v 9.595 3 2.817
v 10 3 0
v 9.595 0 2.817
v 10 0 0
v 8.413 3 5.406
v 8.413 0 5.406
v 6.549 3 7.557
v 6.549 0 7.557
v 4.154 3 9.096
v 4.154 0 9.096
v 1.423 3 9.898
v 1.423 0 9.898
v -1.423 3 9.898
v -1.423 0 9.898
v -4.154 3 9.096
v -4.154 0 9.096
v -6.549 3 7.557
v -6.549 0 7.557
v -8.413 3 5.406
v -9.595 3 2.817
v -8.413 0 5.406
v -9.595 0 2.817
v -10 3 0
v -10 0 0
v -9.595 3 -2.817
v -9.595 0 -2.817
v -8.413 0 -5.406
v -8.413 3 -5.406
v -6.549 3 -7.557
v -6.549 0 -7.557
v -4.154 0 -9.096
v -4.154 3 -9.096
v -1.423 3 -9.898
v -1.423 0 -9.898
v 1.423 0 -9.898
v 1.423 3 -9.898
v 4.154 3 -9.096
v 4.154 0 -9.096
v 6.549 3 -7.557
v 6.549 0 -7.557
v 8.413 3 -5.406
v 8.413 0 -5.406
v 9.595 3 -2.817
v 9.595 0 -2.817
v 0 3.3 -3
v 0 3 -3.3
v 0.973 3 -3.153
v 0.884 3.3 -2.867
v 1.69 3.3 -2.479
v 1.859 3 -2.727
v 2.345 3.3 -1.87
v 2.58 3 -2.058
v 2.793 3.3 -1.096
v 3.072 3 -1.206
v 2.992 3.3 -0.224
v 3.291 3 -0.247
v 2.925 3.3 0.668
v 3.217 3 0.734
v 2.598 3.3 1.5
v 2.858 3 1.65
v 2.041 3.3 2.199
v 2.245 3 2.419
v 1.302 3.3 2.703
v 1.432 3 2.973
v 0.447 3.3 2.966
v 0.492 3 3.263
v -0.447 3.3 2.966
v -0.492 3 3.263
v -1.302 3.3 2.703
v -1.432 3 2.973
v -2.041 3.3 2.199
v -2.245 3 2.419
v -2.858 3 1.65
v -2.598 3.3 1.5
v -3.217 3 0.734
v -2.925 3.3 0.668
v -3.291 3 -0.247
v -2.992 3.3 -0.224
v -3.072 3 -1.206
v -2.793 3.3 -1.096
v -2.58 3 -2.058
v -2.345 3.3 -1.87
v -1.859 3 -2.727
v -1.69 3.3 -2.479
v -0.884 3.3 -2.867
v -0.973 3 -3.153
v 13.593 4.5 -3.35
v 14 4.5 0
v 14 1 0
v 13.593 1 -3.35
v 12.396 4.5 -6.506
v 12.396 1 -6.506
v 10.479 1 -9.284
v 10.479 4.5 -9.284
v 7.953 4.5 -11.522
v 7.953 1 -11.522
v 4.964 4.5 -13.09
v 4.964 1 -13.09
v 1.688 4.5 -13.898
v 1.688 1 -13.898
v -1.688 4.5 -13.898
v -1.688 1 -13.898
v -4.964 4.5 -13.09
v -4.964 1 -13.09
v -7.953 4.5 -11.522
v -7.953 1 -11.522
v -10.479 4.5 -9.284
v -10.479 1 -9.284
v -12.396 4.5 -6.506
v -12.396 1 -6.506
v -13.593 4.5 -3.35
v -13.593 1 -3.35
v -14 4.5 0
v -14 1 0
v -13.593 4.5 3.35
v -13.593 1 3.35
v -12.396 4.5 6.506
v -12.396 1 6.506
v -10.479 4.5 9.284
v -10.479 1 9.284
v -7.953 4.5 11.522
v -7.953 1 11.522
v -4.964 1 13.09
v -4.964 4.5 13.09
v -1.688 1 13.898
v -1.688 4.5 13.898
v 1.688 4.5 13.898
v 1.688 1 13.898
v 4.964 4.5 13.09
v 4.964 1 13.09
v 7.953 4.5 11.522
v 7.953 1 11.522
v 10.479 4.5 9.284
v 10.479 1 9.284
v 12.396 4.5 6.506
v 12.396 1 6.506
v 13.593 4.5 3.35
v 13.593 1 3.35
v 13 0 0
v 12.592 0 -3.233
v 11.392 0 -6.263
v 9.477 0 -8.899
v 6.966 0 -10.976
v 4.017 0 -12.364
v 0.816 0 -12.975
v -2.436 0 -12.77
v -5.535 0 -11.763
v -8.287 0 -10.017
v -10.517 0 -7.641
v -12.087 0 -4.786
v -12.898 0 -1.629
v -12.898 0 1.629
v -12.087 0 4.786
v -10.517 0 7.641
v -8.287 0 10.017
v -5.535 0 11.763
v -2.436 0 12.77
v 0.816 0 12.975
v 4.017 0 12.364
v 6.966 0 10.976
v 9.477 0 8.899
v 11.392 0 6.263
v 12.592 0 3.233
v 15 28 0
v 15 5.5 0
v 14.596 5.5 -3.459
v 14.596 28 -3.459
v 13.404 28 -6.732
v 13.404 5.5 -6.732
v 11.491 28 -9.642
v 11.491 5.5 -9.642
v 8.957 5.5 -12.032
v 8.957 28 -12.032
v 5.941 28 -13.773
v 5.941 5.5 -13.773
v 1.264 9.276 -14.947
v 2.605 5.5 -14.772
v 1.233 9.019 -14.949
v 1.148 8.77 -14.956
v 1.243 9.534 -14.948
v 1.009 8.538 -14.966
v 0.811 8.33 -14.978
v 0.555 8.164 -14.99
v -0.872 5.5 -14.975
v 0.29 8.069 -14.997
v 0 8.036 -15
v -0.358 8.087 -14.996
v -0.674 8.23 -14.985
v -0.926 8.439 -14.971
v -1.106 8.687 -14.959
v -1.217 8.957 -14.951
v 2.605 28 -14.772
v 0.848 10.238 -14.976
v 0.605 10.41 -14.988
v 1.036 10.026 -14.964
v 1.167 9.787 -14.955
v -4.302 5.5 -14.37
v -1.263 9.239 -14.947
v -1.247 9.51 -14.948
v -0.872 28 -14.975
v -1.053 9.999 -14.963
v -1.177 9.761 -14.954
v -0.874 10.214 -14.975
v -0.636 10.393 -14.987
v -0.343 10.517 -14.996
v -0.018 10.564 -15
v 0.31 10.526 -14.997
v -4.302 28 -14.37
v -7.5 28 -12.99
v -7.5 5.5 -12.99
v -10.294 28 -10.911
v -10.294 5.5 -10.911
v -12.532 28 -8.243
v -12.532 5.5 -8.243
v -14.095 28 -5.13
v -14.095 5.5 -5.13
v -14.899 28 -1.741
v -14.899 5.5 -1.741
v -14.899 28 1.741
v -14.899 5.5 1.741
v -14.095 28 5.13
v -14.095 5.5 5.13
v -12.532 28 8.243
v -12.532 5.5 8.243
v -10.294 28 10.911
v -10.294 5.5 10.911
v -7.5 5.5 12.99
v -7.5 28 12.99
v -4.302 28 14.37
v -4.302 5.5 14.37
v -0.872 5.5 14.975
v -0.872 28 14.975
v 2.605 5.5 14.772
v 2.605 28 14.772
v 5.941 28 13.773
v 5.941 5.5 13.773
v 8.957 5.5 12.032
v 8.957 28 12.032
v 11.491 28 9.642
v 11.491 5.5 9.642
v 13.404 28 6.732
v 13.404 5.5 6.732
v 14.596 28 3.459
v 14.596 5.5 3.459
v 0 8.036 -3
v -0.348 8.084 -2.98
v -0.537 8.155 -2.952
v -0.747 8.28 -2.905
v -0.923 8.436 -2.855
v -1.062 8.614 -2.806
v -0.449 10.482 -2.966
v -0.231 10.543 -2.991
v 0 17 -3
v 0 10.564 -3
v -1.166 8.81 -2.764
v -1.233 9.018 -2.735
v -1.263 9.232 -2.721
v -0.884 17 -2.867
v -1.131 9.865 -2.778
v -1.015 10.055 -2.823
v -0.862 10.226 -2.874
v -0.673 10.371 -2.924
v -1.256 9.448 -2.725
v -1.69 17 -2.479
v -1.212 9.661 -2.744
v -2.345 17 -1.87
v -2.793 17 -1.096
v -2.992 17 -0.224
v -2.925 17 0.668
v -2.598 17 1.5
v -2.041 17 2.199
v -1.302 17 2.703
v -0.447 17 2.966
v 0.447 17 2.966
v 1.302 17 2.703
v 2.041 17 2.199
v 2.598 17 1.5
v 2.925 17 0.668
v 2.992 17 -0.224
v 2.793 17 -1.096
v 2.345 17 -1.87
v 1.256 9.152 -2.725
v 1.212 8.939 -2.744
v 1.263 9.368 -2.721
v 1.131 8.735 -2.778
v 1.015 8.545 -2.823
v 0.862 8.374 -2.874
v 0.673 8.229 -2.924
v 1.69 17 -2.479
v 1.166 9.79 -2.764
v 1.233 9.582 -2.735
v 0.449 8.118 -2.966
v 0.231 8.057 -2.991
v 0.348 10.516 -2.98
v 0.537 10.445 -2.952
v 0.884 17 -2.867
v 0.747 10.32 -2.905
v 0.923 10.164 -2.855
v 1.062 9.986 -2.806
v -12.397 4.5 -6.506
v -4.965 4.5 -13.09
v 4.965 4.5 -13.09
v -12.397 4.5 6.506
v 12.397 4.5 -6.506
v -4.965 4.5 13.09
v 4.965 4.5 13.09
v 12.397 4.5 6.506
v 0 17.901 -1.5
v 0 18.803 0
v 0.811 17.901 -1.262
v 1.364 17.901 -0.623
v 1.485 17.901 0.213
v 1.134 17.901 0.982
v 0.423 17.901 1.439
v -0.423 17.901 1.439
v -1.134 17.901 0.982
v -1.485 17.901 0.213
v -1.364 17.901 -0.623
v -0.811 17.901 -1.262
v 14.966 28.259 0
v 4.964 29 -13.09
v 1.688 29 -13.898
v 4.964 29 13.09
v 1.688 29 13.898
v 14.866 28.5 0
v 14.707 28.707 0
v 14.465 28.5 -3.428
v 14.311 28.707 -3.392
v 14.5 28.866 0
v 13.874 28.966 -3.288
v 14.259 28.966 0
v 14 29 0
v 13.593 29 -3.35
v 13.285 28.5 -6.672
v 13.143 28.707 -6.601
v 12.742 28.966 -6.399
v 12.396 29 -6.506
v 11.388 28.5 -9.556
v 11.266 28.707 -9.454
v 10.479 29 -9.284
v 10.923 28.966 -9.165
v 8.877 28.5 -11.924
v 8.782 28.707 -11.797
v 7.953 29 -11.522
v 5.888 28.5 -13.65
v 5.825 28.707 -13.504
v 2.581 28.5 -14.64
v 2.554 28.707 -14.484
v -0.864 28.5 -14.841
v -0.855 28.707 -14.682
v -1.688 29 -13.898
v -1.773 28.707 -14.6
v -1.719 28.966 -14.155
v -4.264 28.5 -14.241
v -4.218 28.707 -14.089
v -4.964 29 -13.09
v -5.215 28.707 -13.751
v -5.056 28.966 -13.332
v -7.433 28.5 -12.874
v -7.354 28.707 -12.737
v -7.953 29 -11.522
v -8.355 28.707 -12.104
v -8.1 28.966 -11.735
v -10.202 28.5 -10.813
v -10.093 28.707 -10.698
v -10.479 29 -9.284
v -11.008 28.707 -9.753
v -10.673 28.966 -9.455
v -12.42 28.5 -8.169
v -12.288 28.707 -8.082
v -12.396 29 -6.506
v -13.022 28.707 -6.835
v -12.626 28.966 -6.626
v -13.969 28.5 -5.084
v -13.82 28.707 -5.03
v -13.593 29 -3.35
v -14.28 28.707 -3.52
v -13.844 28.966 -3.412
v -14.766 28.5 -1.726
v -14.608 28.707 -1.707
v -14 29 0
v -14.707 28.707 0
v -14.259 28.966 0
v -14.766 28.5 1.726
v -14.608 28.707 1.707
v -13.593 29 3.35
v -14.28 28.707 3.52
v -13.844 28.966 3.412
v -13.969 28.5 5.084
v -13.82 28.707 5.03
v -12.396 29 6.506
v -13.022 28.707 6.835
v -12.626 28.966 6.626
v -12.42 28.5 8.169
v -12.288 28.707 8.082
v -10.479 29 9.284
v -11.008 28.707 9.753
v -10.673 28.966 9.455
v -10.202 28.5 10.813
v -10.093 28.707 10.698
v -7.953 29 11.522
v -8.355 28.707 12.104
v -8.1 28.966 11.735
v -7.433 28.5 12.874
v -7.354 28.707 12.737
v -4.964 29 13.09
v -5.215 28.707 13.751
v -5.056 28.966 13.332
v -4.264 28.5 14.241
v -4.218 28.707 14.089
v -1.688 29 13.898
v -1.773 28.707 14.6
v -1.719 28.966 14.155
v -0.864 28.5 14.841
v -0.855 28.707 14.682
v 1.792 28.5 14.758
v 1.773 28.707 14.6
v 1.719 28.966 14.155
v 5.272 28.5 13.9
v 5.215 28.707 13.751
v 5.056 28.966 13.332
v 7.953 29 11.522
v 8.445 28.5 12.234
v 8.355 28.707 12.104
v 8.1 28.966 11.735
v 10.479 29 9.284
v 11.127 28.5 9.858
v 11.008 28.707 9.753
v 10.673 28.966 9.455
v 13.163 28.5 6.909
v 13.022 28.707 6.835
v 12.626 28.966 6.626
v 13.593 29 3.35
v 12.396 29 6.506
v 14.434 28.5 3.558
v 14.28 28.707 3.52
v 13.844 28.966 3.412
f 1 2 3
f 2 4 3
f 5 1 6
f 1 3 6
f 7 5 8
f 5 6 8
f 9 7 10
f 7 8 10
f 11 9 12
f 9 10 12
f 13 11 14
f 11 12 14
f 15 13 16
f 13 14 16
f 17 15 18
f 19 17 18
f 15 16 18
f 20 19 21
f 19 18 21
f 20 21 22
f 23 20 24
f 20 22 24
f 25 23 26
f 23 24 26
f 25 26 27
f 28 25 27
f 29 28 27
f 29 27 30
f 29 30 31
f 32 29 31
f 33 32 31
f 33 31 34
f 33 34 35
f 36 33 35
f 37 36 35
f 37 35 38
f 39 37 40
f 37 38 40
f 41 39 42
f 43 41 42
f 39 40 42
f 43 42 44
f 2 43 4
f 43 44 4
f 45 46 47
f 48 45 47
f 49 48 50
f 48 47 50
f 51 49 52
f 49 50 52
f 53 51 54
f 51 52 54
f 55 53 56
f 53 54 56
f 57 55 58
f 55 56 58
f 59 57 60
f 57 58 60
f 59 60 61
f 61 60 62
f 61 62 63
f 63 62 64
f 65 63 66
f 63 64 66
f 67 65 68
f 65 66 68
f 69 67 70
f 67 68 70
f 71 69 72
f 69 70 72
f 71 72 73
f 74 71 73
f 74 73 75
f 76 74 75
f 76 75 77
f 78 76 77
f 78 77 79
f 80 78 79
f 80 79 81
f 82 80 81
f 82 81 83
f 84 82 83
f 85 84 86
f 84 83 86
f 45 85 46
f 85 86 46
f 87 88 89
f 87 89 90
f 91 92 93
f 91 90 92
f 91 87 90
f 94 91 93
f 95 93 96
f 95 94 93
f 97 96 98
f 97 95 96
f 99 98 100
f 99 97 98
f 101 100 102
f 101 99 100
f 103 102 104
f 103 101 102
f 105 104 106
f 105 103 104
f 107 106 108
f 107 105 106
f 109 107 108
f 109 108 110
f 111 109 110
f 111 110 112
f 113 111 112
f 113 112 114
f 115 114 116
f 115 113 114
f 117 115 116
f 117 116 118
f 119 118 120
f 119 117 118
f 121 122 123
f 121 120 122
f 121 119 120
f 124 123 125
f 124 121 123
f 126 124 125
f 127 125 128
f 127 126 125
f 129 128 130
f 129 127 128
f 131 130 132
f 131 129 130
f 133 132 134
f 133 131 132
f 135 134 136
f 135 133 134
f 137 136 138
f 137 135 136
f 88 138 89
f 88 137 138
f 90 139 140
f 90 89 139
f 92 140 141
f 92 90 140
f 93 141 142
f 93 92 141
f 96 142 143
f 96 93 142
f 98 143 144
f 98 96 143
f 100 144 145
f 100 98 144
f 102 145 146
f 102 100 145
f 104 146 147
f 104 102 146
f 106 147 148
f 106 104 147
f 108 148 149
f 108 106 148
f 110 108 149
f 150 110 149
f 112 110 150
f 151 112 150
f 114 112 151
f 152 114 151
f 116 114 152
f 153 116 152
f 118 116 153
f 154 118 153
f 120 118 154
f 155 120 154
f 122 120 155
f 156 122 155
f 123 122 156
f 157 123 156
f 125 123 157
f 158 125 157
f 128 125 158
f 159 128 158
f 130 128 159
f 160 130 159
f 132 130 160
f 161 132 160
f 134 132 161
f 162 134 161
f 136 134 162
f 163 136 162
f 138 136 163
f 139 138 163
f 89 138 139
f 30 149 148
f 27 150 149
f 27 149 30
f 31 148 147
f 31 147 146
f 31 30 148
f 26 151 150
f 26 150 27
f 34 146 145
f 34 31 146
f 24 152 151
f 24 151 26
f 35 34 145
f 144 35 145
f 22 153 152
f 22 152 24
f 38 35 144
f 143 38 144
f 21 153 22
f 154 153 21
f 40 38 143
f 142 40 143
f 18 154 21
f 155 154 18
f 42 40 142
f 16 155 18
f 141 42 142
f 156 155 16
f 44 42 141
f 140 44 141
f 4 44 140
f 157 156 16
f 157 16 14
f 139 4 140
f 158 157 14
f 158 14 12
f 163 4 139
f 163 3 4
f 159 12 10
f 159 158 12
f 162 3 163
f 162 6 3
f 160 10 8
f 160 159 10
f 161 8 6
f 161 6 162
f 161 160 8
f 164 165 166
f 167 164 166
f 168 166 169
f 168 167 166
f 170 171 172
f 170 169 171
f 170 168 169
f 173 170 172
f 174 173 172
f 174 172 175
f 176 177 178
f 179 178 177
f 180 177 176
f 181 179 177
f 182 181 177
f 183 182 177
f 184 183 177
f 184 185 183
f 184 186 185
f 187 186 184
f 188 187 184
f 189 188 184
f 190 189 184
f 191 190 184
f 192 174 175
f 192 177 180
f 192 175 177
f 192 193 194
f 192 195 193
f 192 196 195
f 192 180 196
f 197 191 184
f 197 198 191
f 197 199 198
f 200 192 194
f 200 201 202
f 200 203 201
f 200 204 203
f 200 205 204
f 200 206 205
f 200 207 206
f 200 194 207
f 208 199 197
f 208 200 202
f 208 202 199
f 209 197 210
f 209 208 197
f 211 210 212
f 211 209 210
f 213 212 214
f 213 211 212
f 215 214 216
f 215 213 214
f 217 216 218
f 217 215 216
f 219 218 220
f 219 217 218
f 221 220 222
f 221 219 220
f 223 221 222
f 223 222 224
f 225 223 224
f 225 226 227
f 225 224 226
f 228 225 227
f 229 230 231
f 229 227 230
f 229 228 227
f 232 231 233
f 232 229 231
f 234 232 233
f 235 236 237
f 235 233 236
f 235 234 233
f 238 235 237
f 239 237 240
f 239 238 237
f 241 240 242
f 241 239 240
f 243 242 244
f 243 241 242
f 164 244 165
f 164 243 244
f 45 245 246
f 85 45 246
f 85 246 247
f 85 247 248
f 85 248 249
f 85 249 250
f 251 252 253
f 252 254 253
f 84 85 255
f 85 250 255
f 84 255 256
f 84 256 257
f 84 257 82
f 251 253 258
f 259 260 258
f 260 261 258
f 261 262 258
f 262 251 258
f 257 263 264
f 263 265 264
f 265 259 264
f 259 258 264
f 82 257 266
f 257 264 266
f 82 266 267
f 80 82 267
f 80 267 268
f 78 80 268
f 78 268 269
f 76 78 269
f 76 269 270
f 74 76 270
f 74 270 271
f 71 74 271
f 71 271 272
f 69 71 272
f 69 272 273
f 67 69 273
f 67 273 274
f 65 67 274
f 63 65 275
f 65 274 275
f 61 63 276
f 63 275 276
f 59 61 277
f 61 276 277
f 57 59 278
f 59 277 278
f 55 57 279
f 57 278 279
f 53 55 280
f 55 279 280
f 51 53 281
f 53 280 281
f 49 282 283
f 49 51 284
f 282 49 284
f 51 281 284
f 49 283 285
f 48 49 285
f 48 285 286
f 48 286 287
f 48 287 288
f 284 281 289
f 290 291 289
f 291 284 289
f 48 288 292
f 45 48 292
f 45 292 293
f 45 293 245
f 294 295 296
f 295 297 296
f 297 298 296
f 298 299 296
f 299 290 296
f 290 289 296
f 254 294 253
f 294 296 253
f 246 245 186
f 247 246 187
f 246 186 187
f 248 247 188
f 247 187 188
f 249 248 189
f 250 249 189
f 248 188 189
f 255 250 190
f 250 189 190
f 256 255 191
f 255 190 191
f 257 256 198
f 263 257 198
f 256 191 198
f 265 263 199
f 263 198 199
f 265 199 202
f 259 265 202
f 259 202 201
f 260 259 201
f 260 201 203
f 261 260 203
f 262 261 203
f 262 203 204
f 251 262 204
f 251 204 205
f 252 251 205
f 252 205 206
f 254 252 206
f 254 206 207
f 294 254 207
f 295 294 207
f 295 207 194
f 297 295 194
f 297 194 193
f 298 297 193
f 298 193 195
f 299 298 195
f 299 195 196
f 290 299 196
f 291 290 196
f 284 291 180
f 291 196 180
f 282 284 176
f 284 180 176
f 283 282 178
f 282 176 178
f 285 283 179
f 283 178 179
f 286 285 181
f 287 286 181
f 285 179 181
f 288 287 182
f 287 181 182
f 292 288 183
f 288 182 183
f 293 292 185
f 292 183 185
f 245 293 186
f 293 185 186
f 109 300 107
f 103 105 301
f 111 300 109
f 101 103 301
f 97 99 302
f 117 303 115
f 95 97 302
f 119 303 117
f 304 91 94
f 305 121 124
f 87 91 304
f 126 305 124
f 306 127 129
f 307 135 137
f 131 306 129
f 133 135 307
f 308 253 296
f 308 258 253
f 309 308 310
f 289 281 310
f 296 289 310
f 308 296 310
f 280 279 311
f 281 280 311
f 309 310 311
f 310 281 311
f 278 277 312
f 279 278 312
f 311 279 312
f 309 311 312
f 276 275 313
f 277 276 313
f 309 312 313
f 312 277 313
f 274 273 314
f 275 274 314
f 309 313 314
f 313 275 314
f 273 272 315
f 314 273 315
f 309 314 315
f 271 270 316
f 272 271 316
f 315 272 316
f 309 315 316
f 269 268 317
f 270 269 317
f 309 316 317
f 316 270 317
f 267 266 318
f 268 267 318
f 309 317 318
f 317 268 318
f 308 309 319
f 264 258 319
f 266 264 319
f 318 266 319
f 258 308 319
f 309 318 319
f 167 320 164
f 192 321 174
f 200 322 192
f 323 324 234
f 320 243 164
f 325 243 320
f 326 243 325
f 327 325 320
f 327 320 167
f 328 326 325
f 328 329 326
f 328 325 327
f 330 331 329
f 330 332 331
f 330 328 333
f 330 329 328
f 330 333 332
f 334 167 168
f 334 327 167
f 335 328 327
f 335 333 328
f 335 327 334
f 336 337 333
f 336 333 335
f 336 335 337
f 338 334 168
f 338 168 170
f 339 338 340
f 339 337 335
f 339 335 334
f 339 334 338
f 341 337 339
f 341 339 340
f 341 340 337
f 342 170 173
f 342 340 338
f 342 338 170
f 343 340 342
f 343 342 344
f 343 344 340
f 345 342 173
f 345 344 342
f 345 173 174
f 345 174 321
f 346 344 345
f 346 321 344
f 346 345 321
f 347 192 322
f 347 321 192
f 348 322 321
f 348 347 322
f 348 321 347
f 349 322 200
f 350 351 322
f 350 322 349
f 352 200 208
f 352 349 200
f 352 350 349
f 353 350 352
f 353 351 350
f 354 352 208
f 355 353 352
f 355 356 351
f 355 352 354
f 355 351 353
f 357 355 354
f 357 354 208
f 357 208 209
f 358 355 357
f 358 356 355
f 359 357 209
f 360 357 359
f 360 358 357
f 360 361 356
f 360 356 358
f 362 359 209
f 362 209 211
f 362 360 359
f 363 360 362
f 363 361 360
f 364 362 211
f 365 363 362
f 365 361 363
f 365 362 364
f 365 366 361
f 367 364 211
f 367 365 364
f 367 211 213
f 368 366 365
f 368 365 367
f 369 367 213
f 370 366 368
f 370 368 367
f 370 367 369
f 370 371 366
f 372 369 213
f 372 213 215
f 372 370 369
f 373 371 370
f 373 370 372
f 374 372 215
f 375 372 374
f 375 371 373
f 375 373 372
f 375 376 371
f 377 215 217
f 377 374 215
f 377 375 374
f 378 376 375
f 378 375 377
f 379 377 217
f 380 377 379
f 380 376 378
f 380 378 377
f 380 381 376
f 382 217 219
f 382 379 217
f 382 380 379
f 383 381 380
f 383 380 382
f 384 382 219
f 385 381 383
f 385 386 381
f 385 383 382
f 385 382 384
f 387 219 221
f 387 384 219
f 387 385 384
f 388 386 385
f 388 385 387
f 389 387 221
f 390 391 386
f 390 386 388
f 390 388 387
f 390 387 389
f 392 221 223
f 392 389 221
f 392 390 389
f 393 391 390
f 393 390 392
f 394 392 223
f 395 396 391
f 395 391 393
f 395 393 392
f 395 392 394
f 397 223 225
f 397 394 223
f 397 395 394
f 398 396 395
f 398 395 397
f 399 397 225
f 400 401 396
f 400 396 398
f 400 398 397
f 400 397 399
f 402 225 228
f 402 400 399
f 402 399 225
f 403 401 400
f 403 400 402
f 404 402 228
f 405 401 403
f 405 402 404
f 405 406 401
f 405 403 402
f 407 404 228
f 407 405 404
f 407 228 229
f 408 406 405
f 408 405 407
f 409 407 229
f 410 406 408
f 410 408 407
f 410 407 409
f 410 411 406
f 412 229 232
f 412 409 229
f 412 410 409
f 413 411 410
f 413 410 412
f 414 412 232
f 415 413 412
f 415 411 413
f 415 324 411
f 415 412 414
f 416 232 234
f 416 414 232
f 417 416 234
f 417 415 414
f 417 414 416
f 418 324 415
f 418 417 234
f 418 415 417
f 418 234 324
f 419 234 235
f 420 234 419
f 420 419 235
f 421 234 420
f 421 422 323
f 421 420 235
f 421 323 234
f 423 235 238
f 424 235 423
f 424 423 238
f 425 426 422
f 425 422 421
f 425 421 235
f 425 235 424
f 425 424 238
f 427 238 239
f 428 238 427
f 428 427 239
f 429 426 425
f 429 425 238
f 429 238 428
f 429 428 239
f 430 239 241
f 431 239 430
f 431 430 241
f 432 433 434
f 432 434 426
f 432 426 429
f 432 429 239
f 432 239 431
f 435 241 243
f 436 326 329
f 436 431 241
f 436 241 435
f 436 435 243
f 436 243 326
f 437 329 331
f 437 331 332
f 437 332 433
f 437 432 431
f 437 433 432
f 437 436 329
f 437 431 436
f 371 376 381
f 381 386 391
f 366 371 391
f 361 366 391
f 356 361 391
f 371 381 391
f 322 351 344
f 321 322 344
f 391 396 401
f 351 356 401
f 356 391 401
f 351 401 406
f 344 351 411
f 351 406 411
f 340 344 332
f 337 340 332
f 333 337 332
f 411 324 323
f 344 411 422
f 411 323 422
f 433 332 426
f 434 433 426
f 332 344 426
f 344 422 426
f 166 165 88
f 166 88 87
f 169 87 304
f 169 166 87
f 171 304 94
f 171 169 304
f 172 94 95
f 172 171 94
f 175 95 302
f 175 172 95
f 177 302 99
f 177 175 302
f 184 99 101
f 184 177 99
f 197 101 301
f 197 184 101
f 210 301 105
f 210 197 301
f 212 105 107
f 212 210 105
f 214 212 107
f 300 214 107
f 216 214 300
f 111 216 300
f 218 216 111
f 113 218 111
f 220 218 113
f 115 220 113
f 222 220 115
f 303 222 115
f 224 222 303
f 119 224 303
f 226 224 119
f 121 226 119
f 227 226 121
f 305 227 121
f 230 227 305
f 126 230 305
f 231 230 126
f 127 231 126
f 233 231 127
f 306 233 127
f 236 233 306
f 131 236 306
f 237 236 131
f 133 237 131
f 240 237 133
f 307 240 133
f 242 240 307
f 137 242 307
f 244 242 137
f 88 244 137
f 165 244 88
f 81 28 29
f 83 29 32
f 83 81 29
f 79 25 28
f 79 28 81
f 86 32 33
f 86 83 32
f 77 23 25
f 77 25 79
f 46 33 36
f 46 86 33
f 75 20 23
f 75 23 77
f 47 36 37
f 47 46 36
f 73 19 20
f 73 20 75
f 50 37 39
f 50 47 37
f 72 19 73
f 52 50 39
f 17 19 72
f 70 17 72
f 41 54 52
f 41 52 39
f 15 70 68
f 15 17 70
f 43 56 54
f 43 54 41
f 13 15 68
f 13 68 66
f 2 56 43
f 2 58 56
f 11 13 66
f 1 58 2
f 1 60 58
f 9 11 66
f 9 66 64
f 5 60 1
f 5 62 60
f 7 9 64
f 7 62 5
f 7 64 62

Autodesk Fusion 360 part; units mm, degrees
sketch "Sketch1" plane through (0, 0, 0) normal (0, 0, 1) x (1, 0, 0)
  line L0 (0, 3) -> (10, 3)
  line L1 (10, 3) -> (10, 0)
  line L2 (10, 0) -> (14, 0)
  line L3 (14, 0) -> (14, 4.5)
  line L4 (14, 4.5) -> (15, 4.5)
  line L5 (15, 4.5) -> (15, 29)
  line L6 (15, 29) -> (0, 29)
  line L7 (0, 29) -> (0, 3)
  dimension "d1" = 30
  dimension "d2" = 29
  dimension "d3" = 28
  dimension "d4" = 20
  dimension "d5" = 3
  dimension "d6" = 4.5
revolve "Revolve1" add sketch "Sketch1" angle 360 about axis through (0, 29, 0) along (0, -1, 0)
chamfer "Chamfer1" distance 1 angle 45 2 edges at (-13.9849, 4.5, -5.4242) (-13.0526, 0, -5.0626)
sketch "Sketch2" plane through (0, 3, 0) normal (0, -1, 0) x (1, 0, 0)
  circle A0 centre (0, 0) radius 10
hole "Hole1" at (0, 3, 0) direction (0, 1, 0) diameter 6 depth 14 tip angle 118
sketch "Sketch3" plane through (0, 0, 0) normal (0, 0, 1) x (1, 0, 0)
  line L0 (13, 0) -> (-13, 0)
  point P0 (0, 9.3)
  dimension "d12" = 9.3
hole "Hole2" at (0, 9.3, 0) direction (0, 0, -1) diameter 2.529 end through all
chamfer "Chamfer2" distance 0.3 angle 45 1 edges at (1.0848, 3, 2.797)
fillet "Fillet1" radius 1 1 edges at (-13.9849, 29, -5.4242)
